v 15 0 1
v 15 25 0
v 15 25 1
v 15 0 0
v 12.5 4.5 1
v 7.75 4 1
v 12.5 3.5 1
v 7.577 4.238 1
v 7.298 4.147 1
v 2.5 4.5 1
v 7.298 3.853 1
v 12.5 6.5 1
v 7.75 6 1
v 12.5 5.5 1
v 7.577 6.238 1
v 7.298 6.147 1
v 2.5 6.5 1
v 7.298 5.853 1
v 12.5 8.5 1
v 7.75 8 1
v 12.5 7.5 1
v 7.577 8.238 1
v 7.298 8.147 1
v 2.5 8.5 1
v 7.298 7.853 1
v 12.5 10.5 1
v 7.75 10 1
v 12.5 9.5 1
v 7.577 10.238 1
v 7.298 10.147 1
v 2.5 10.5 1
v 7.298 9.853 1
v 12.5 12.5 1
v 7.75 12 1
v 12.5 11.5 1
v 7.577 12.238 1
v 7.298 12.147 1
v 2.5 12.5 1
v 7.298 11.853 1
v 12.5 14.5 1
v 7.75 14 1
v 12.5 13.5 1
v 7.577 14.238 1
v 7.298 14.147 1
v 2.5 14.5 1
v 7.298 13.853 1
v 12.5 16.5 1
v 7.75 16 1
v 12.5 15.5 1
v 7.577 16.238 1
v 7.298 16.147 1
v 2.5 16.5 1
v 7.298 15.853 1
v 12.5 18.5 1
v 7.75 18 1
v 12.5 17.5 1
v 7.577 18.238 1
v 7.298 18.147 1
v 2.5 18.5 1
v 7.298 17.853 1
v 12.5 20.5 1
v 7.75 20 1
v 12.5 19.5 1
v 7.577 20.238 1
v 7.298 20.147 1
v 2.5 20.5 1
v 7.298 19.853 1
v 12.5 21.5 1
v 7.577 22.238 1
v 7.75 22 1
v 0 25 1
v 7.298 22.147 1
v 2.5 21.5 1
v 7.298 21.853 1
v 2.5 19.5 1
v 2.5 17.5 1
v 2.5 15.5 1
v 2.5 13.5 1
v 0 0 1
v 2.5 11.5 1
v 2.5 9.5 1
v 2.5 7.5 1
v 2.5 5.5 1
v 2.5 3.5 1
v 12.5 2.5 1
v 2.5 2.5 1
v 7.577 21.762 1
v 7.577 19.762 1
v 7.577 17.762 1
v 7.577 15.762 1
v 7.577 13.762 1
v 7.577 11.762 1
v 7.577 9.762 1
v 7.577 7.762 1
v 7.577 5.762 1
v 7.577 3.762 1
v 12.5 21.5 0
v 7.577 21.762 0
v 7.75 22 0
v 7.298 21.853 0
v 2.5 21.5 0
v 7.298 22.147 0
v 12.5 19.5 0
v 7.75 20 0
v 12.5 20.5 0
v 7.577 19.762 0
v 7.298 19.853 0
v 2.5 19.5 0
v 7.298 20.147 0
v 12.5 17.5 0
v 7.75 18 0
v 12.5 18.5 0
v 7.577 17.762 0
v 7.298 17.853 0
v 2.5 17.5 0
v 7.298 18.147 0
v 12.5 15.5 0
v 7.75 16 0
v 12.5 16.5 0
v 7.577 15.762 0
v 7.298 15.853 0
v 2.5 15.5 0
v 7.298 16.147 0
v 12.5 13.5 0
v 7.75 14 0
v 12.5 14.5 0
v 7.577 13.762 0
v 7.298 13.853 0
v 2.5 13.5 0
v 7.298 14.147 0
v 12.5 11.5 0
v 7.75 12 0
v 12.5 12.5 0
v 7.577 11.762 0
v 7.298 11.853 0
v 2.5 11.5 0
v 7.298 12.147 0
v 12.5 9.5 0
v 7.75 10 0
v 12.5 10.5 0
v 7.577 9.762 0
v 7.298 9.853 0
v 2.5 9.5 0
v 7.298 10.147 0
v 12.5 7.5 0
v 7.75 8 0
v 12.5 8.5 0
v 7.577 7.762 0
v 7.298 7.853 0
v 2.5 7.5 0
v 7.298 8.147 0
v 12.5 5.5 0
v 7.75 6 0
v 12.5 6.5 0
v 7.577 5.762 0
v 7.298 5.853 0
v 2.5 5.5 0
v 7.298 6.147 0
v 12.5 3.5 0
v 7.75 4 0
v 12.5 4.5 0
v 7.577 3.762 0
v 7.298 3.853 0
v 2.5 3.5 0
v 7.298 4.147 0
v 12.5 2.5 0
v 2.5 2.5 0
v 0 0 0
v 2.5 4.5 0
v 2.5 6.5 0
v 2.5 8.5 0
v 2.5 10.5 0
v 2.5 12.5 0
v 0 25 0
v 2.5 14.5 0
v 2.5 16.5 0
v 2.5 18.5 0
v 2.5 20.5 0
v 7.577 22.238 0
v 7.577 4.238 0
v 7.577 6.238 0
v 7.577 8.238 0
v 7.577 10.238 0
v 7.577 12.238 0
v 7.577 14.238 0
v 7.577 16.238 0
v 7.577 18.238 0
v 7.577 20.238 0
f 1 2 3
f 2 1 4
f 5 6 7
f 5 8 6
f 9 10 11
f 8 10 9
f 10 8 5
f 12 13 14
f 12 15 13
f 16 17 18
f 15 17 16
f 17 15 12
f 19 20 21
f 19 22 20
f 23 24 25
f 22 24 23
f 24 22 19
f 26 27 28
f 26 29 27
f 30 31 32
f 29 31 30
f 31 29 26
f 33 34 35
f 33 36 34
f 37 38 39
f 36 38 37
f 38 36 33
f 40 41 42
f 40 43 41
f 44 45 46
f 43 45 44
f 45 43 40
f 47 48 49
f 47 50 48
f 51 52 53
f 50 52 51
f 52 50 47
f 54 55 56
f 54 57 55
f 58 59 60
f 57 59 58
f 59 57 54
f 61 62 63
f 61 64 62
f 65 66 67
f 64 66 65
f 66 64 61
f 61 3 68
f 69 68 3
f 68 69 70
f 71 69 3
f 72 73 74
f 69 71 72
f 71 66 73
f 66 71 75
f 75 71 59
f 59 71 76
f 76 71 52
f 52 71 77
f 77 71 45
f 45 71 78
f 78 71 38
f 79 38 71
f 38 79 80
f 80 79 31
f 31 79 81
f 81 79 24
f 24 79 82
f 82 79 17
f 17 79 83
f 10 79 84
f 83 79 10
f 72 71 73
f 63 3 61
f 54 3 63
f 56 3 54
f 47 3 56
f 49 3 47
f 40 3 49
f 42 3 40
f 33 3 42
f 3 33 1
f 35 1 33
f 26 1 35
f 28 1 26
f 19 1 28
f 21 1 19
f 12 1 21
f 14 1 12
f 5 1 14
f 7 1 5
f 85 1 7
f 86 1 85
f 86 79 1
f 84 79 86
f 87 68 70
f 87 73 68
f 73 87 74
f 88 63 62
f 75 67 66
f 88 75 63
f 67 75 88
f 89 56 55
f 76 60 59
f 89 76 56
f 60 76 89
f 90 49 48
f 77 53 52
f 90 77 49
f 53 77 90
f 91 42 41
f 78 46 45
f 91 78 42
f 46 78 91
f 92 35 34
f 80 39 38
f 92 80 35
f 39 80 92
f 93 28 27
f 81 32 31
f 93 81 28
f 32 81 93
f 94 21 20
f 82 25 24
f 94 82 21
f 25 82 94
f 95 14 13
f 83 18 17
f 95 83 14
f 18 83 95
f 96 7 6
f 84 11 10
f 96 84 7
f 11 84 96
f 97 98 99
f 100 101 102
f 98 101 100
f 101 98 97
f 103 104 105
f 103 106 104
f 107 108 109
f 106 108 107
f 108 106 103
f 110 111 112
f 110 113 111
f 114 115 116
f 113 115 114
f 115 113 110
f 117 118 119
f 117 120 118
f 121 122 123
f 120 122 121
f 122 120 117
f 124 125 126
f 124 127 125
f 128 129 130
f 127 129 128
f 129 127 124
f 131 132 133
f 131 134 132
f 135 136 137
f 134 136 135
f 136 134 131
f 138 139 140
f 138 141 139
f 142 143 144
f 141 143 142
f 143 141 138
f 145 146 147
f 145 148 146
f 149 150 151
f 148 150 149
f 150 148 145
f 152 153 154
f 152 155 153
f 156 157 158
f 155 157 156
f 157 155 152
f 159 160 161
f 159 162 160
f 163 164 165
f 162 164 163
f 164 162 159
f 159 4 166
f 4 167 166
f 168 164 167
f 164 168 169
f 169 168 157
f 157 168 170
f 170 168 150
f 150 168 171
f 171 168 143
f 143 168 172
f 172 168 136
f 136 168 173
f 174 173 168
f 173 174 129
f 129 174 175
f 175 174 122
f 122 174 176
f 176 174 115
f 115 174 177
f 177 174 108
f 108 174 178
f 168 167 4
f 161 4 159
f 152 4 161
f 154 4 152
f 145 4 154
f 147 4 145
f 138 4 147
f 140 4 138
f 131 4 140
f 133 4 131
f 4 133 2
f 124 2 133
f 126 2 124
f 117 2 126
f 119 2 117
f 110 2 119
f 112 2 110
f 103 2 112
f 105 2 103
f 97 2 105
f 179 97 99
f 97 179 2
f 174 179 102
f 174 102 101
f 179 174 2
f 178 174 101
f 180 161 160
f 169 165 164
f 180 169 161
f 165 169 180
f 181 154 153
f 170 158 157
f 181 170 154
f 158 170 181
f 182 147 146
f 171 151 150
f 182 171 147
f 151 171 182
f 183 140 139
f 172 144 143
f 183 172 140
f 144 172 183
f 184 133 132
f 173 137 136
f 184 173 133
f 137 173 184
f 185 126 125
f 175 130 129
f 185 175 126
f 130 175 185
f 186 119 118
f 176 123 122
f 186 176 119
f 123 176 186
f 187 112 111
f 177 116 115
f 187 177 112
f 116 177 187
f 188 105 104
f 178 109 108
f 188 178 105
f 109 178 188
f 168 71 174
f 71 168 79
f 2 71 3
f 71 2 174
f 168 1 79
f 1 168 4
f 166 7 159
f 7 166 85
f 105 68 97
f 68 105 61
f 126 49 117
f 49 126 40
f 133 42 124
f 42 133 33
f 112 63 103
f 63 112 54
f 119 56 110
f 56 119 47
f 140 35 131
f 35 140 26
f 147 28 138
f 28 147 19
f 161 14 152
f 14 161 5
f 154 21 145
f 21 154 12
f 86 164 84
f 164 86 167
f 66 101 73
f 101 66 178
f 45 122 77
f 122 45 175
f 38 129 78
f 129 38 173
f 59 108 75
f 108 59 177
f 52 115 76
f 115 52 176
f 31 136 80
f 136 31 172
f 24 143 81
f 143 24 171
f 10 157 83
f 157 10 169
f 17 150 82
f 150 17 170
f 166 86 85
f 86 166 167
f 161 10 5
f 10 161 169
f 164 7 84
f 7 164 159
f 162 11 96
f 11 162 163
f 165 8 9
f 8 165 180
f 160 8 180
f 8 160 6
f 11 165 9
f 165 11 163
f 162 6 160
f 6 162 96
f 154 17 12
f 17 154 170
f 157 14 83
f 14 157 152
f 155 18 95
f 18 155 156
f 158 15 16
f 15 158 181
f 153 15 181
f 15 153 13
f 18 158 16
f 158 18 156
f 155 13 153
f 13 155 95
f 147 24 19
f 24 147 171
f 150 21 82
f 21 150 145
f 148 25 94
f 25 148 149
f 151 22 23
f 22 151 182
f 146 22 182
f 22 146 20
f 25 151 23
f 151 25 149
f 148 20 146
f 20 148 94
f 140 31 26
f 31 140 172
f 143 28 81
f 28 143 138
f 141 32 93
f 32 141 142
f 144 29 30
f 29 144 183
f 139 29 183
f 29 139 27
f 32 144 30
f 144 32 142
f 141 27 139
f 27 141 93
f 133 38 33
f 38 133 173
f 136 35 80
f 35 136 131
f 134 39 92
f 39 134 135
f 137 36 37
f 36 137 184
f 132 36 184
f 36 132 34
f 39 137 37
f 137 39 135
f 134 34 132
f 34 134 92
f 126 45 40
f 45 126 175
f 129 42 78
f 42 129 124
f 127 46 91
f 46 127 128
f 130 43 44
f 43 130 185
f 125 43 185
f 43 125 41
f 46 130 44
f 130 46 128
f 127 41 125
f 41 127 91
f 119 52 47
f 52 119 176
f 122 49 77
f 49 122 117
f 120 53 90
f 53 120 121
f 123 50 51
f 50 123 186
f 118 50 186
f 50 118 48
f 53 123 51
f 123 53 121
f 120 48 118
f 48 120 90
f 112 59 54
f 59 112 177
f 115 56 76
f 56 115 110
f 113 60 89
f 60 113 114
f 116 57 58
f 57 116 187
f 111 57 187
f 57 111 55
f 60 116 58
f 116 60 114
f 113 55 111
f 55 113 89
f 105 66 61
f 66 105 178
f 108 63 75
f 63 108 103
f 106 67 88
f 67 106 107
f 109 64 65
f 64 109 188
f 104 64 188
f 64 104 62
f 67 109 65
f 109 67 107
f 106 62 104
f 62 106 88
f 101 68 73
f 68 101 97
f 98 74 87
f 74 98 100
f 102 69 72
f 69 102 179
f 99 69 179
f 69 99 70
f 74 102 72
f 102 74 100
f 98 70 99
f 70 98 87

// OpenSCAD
//How many warp threads
warp_count = 20;

//How wide is each thread
warp_diameter = .5;

//How high is the Heddle
heddle_height = 10; 

//2D to make DXF files, 3D for STL
2Dv3D = "3D"; // [2D, 3D]


/* [Hidden] */
warp_dia = warp_diameter; 
weft_dia = warp_dia; 
shaft_width = warp_dia + weft_dia ;
heddle_frame_width = 5*warp_dia;
heddle_frame = heddle_frame_width * 2;
heddle_width = shaft_width  * warp_count;
tt = 0.1;

if (2Dv3D=="2D") {
    projection() heddle();
    }
  else {
    heddle();
    }


module heddle() {
    difference () {  
        cube([heddle_height + heddle_frame, heddle_width + heddle_frame, shaft_width]);
        translate ([heddle_frame_width , heddle_frame_width, -tt/2 ]) 
            cube([heddle_height, heddle_width, shaft_width+tt ]);
        }
    for (I = [ heddle_frame_width + shaft_width : shaft_width *2: heddle_width+heddle_frame - shaft_width  ]) {  
        translate ([0, I, 0]) 
            difference () {
                cube ([heddle_height + heddle_frame, shaft_width, shaft_width] );
                translate ( [(heddle_height + heddle_frame) / 2, shaft_width/2, -tt/2] ) 
                    cylinder ( h=shaft_width+tt, r=warp_dia/2);
                }
            }
        }
